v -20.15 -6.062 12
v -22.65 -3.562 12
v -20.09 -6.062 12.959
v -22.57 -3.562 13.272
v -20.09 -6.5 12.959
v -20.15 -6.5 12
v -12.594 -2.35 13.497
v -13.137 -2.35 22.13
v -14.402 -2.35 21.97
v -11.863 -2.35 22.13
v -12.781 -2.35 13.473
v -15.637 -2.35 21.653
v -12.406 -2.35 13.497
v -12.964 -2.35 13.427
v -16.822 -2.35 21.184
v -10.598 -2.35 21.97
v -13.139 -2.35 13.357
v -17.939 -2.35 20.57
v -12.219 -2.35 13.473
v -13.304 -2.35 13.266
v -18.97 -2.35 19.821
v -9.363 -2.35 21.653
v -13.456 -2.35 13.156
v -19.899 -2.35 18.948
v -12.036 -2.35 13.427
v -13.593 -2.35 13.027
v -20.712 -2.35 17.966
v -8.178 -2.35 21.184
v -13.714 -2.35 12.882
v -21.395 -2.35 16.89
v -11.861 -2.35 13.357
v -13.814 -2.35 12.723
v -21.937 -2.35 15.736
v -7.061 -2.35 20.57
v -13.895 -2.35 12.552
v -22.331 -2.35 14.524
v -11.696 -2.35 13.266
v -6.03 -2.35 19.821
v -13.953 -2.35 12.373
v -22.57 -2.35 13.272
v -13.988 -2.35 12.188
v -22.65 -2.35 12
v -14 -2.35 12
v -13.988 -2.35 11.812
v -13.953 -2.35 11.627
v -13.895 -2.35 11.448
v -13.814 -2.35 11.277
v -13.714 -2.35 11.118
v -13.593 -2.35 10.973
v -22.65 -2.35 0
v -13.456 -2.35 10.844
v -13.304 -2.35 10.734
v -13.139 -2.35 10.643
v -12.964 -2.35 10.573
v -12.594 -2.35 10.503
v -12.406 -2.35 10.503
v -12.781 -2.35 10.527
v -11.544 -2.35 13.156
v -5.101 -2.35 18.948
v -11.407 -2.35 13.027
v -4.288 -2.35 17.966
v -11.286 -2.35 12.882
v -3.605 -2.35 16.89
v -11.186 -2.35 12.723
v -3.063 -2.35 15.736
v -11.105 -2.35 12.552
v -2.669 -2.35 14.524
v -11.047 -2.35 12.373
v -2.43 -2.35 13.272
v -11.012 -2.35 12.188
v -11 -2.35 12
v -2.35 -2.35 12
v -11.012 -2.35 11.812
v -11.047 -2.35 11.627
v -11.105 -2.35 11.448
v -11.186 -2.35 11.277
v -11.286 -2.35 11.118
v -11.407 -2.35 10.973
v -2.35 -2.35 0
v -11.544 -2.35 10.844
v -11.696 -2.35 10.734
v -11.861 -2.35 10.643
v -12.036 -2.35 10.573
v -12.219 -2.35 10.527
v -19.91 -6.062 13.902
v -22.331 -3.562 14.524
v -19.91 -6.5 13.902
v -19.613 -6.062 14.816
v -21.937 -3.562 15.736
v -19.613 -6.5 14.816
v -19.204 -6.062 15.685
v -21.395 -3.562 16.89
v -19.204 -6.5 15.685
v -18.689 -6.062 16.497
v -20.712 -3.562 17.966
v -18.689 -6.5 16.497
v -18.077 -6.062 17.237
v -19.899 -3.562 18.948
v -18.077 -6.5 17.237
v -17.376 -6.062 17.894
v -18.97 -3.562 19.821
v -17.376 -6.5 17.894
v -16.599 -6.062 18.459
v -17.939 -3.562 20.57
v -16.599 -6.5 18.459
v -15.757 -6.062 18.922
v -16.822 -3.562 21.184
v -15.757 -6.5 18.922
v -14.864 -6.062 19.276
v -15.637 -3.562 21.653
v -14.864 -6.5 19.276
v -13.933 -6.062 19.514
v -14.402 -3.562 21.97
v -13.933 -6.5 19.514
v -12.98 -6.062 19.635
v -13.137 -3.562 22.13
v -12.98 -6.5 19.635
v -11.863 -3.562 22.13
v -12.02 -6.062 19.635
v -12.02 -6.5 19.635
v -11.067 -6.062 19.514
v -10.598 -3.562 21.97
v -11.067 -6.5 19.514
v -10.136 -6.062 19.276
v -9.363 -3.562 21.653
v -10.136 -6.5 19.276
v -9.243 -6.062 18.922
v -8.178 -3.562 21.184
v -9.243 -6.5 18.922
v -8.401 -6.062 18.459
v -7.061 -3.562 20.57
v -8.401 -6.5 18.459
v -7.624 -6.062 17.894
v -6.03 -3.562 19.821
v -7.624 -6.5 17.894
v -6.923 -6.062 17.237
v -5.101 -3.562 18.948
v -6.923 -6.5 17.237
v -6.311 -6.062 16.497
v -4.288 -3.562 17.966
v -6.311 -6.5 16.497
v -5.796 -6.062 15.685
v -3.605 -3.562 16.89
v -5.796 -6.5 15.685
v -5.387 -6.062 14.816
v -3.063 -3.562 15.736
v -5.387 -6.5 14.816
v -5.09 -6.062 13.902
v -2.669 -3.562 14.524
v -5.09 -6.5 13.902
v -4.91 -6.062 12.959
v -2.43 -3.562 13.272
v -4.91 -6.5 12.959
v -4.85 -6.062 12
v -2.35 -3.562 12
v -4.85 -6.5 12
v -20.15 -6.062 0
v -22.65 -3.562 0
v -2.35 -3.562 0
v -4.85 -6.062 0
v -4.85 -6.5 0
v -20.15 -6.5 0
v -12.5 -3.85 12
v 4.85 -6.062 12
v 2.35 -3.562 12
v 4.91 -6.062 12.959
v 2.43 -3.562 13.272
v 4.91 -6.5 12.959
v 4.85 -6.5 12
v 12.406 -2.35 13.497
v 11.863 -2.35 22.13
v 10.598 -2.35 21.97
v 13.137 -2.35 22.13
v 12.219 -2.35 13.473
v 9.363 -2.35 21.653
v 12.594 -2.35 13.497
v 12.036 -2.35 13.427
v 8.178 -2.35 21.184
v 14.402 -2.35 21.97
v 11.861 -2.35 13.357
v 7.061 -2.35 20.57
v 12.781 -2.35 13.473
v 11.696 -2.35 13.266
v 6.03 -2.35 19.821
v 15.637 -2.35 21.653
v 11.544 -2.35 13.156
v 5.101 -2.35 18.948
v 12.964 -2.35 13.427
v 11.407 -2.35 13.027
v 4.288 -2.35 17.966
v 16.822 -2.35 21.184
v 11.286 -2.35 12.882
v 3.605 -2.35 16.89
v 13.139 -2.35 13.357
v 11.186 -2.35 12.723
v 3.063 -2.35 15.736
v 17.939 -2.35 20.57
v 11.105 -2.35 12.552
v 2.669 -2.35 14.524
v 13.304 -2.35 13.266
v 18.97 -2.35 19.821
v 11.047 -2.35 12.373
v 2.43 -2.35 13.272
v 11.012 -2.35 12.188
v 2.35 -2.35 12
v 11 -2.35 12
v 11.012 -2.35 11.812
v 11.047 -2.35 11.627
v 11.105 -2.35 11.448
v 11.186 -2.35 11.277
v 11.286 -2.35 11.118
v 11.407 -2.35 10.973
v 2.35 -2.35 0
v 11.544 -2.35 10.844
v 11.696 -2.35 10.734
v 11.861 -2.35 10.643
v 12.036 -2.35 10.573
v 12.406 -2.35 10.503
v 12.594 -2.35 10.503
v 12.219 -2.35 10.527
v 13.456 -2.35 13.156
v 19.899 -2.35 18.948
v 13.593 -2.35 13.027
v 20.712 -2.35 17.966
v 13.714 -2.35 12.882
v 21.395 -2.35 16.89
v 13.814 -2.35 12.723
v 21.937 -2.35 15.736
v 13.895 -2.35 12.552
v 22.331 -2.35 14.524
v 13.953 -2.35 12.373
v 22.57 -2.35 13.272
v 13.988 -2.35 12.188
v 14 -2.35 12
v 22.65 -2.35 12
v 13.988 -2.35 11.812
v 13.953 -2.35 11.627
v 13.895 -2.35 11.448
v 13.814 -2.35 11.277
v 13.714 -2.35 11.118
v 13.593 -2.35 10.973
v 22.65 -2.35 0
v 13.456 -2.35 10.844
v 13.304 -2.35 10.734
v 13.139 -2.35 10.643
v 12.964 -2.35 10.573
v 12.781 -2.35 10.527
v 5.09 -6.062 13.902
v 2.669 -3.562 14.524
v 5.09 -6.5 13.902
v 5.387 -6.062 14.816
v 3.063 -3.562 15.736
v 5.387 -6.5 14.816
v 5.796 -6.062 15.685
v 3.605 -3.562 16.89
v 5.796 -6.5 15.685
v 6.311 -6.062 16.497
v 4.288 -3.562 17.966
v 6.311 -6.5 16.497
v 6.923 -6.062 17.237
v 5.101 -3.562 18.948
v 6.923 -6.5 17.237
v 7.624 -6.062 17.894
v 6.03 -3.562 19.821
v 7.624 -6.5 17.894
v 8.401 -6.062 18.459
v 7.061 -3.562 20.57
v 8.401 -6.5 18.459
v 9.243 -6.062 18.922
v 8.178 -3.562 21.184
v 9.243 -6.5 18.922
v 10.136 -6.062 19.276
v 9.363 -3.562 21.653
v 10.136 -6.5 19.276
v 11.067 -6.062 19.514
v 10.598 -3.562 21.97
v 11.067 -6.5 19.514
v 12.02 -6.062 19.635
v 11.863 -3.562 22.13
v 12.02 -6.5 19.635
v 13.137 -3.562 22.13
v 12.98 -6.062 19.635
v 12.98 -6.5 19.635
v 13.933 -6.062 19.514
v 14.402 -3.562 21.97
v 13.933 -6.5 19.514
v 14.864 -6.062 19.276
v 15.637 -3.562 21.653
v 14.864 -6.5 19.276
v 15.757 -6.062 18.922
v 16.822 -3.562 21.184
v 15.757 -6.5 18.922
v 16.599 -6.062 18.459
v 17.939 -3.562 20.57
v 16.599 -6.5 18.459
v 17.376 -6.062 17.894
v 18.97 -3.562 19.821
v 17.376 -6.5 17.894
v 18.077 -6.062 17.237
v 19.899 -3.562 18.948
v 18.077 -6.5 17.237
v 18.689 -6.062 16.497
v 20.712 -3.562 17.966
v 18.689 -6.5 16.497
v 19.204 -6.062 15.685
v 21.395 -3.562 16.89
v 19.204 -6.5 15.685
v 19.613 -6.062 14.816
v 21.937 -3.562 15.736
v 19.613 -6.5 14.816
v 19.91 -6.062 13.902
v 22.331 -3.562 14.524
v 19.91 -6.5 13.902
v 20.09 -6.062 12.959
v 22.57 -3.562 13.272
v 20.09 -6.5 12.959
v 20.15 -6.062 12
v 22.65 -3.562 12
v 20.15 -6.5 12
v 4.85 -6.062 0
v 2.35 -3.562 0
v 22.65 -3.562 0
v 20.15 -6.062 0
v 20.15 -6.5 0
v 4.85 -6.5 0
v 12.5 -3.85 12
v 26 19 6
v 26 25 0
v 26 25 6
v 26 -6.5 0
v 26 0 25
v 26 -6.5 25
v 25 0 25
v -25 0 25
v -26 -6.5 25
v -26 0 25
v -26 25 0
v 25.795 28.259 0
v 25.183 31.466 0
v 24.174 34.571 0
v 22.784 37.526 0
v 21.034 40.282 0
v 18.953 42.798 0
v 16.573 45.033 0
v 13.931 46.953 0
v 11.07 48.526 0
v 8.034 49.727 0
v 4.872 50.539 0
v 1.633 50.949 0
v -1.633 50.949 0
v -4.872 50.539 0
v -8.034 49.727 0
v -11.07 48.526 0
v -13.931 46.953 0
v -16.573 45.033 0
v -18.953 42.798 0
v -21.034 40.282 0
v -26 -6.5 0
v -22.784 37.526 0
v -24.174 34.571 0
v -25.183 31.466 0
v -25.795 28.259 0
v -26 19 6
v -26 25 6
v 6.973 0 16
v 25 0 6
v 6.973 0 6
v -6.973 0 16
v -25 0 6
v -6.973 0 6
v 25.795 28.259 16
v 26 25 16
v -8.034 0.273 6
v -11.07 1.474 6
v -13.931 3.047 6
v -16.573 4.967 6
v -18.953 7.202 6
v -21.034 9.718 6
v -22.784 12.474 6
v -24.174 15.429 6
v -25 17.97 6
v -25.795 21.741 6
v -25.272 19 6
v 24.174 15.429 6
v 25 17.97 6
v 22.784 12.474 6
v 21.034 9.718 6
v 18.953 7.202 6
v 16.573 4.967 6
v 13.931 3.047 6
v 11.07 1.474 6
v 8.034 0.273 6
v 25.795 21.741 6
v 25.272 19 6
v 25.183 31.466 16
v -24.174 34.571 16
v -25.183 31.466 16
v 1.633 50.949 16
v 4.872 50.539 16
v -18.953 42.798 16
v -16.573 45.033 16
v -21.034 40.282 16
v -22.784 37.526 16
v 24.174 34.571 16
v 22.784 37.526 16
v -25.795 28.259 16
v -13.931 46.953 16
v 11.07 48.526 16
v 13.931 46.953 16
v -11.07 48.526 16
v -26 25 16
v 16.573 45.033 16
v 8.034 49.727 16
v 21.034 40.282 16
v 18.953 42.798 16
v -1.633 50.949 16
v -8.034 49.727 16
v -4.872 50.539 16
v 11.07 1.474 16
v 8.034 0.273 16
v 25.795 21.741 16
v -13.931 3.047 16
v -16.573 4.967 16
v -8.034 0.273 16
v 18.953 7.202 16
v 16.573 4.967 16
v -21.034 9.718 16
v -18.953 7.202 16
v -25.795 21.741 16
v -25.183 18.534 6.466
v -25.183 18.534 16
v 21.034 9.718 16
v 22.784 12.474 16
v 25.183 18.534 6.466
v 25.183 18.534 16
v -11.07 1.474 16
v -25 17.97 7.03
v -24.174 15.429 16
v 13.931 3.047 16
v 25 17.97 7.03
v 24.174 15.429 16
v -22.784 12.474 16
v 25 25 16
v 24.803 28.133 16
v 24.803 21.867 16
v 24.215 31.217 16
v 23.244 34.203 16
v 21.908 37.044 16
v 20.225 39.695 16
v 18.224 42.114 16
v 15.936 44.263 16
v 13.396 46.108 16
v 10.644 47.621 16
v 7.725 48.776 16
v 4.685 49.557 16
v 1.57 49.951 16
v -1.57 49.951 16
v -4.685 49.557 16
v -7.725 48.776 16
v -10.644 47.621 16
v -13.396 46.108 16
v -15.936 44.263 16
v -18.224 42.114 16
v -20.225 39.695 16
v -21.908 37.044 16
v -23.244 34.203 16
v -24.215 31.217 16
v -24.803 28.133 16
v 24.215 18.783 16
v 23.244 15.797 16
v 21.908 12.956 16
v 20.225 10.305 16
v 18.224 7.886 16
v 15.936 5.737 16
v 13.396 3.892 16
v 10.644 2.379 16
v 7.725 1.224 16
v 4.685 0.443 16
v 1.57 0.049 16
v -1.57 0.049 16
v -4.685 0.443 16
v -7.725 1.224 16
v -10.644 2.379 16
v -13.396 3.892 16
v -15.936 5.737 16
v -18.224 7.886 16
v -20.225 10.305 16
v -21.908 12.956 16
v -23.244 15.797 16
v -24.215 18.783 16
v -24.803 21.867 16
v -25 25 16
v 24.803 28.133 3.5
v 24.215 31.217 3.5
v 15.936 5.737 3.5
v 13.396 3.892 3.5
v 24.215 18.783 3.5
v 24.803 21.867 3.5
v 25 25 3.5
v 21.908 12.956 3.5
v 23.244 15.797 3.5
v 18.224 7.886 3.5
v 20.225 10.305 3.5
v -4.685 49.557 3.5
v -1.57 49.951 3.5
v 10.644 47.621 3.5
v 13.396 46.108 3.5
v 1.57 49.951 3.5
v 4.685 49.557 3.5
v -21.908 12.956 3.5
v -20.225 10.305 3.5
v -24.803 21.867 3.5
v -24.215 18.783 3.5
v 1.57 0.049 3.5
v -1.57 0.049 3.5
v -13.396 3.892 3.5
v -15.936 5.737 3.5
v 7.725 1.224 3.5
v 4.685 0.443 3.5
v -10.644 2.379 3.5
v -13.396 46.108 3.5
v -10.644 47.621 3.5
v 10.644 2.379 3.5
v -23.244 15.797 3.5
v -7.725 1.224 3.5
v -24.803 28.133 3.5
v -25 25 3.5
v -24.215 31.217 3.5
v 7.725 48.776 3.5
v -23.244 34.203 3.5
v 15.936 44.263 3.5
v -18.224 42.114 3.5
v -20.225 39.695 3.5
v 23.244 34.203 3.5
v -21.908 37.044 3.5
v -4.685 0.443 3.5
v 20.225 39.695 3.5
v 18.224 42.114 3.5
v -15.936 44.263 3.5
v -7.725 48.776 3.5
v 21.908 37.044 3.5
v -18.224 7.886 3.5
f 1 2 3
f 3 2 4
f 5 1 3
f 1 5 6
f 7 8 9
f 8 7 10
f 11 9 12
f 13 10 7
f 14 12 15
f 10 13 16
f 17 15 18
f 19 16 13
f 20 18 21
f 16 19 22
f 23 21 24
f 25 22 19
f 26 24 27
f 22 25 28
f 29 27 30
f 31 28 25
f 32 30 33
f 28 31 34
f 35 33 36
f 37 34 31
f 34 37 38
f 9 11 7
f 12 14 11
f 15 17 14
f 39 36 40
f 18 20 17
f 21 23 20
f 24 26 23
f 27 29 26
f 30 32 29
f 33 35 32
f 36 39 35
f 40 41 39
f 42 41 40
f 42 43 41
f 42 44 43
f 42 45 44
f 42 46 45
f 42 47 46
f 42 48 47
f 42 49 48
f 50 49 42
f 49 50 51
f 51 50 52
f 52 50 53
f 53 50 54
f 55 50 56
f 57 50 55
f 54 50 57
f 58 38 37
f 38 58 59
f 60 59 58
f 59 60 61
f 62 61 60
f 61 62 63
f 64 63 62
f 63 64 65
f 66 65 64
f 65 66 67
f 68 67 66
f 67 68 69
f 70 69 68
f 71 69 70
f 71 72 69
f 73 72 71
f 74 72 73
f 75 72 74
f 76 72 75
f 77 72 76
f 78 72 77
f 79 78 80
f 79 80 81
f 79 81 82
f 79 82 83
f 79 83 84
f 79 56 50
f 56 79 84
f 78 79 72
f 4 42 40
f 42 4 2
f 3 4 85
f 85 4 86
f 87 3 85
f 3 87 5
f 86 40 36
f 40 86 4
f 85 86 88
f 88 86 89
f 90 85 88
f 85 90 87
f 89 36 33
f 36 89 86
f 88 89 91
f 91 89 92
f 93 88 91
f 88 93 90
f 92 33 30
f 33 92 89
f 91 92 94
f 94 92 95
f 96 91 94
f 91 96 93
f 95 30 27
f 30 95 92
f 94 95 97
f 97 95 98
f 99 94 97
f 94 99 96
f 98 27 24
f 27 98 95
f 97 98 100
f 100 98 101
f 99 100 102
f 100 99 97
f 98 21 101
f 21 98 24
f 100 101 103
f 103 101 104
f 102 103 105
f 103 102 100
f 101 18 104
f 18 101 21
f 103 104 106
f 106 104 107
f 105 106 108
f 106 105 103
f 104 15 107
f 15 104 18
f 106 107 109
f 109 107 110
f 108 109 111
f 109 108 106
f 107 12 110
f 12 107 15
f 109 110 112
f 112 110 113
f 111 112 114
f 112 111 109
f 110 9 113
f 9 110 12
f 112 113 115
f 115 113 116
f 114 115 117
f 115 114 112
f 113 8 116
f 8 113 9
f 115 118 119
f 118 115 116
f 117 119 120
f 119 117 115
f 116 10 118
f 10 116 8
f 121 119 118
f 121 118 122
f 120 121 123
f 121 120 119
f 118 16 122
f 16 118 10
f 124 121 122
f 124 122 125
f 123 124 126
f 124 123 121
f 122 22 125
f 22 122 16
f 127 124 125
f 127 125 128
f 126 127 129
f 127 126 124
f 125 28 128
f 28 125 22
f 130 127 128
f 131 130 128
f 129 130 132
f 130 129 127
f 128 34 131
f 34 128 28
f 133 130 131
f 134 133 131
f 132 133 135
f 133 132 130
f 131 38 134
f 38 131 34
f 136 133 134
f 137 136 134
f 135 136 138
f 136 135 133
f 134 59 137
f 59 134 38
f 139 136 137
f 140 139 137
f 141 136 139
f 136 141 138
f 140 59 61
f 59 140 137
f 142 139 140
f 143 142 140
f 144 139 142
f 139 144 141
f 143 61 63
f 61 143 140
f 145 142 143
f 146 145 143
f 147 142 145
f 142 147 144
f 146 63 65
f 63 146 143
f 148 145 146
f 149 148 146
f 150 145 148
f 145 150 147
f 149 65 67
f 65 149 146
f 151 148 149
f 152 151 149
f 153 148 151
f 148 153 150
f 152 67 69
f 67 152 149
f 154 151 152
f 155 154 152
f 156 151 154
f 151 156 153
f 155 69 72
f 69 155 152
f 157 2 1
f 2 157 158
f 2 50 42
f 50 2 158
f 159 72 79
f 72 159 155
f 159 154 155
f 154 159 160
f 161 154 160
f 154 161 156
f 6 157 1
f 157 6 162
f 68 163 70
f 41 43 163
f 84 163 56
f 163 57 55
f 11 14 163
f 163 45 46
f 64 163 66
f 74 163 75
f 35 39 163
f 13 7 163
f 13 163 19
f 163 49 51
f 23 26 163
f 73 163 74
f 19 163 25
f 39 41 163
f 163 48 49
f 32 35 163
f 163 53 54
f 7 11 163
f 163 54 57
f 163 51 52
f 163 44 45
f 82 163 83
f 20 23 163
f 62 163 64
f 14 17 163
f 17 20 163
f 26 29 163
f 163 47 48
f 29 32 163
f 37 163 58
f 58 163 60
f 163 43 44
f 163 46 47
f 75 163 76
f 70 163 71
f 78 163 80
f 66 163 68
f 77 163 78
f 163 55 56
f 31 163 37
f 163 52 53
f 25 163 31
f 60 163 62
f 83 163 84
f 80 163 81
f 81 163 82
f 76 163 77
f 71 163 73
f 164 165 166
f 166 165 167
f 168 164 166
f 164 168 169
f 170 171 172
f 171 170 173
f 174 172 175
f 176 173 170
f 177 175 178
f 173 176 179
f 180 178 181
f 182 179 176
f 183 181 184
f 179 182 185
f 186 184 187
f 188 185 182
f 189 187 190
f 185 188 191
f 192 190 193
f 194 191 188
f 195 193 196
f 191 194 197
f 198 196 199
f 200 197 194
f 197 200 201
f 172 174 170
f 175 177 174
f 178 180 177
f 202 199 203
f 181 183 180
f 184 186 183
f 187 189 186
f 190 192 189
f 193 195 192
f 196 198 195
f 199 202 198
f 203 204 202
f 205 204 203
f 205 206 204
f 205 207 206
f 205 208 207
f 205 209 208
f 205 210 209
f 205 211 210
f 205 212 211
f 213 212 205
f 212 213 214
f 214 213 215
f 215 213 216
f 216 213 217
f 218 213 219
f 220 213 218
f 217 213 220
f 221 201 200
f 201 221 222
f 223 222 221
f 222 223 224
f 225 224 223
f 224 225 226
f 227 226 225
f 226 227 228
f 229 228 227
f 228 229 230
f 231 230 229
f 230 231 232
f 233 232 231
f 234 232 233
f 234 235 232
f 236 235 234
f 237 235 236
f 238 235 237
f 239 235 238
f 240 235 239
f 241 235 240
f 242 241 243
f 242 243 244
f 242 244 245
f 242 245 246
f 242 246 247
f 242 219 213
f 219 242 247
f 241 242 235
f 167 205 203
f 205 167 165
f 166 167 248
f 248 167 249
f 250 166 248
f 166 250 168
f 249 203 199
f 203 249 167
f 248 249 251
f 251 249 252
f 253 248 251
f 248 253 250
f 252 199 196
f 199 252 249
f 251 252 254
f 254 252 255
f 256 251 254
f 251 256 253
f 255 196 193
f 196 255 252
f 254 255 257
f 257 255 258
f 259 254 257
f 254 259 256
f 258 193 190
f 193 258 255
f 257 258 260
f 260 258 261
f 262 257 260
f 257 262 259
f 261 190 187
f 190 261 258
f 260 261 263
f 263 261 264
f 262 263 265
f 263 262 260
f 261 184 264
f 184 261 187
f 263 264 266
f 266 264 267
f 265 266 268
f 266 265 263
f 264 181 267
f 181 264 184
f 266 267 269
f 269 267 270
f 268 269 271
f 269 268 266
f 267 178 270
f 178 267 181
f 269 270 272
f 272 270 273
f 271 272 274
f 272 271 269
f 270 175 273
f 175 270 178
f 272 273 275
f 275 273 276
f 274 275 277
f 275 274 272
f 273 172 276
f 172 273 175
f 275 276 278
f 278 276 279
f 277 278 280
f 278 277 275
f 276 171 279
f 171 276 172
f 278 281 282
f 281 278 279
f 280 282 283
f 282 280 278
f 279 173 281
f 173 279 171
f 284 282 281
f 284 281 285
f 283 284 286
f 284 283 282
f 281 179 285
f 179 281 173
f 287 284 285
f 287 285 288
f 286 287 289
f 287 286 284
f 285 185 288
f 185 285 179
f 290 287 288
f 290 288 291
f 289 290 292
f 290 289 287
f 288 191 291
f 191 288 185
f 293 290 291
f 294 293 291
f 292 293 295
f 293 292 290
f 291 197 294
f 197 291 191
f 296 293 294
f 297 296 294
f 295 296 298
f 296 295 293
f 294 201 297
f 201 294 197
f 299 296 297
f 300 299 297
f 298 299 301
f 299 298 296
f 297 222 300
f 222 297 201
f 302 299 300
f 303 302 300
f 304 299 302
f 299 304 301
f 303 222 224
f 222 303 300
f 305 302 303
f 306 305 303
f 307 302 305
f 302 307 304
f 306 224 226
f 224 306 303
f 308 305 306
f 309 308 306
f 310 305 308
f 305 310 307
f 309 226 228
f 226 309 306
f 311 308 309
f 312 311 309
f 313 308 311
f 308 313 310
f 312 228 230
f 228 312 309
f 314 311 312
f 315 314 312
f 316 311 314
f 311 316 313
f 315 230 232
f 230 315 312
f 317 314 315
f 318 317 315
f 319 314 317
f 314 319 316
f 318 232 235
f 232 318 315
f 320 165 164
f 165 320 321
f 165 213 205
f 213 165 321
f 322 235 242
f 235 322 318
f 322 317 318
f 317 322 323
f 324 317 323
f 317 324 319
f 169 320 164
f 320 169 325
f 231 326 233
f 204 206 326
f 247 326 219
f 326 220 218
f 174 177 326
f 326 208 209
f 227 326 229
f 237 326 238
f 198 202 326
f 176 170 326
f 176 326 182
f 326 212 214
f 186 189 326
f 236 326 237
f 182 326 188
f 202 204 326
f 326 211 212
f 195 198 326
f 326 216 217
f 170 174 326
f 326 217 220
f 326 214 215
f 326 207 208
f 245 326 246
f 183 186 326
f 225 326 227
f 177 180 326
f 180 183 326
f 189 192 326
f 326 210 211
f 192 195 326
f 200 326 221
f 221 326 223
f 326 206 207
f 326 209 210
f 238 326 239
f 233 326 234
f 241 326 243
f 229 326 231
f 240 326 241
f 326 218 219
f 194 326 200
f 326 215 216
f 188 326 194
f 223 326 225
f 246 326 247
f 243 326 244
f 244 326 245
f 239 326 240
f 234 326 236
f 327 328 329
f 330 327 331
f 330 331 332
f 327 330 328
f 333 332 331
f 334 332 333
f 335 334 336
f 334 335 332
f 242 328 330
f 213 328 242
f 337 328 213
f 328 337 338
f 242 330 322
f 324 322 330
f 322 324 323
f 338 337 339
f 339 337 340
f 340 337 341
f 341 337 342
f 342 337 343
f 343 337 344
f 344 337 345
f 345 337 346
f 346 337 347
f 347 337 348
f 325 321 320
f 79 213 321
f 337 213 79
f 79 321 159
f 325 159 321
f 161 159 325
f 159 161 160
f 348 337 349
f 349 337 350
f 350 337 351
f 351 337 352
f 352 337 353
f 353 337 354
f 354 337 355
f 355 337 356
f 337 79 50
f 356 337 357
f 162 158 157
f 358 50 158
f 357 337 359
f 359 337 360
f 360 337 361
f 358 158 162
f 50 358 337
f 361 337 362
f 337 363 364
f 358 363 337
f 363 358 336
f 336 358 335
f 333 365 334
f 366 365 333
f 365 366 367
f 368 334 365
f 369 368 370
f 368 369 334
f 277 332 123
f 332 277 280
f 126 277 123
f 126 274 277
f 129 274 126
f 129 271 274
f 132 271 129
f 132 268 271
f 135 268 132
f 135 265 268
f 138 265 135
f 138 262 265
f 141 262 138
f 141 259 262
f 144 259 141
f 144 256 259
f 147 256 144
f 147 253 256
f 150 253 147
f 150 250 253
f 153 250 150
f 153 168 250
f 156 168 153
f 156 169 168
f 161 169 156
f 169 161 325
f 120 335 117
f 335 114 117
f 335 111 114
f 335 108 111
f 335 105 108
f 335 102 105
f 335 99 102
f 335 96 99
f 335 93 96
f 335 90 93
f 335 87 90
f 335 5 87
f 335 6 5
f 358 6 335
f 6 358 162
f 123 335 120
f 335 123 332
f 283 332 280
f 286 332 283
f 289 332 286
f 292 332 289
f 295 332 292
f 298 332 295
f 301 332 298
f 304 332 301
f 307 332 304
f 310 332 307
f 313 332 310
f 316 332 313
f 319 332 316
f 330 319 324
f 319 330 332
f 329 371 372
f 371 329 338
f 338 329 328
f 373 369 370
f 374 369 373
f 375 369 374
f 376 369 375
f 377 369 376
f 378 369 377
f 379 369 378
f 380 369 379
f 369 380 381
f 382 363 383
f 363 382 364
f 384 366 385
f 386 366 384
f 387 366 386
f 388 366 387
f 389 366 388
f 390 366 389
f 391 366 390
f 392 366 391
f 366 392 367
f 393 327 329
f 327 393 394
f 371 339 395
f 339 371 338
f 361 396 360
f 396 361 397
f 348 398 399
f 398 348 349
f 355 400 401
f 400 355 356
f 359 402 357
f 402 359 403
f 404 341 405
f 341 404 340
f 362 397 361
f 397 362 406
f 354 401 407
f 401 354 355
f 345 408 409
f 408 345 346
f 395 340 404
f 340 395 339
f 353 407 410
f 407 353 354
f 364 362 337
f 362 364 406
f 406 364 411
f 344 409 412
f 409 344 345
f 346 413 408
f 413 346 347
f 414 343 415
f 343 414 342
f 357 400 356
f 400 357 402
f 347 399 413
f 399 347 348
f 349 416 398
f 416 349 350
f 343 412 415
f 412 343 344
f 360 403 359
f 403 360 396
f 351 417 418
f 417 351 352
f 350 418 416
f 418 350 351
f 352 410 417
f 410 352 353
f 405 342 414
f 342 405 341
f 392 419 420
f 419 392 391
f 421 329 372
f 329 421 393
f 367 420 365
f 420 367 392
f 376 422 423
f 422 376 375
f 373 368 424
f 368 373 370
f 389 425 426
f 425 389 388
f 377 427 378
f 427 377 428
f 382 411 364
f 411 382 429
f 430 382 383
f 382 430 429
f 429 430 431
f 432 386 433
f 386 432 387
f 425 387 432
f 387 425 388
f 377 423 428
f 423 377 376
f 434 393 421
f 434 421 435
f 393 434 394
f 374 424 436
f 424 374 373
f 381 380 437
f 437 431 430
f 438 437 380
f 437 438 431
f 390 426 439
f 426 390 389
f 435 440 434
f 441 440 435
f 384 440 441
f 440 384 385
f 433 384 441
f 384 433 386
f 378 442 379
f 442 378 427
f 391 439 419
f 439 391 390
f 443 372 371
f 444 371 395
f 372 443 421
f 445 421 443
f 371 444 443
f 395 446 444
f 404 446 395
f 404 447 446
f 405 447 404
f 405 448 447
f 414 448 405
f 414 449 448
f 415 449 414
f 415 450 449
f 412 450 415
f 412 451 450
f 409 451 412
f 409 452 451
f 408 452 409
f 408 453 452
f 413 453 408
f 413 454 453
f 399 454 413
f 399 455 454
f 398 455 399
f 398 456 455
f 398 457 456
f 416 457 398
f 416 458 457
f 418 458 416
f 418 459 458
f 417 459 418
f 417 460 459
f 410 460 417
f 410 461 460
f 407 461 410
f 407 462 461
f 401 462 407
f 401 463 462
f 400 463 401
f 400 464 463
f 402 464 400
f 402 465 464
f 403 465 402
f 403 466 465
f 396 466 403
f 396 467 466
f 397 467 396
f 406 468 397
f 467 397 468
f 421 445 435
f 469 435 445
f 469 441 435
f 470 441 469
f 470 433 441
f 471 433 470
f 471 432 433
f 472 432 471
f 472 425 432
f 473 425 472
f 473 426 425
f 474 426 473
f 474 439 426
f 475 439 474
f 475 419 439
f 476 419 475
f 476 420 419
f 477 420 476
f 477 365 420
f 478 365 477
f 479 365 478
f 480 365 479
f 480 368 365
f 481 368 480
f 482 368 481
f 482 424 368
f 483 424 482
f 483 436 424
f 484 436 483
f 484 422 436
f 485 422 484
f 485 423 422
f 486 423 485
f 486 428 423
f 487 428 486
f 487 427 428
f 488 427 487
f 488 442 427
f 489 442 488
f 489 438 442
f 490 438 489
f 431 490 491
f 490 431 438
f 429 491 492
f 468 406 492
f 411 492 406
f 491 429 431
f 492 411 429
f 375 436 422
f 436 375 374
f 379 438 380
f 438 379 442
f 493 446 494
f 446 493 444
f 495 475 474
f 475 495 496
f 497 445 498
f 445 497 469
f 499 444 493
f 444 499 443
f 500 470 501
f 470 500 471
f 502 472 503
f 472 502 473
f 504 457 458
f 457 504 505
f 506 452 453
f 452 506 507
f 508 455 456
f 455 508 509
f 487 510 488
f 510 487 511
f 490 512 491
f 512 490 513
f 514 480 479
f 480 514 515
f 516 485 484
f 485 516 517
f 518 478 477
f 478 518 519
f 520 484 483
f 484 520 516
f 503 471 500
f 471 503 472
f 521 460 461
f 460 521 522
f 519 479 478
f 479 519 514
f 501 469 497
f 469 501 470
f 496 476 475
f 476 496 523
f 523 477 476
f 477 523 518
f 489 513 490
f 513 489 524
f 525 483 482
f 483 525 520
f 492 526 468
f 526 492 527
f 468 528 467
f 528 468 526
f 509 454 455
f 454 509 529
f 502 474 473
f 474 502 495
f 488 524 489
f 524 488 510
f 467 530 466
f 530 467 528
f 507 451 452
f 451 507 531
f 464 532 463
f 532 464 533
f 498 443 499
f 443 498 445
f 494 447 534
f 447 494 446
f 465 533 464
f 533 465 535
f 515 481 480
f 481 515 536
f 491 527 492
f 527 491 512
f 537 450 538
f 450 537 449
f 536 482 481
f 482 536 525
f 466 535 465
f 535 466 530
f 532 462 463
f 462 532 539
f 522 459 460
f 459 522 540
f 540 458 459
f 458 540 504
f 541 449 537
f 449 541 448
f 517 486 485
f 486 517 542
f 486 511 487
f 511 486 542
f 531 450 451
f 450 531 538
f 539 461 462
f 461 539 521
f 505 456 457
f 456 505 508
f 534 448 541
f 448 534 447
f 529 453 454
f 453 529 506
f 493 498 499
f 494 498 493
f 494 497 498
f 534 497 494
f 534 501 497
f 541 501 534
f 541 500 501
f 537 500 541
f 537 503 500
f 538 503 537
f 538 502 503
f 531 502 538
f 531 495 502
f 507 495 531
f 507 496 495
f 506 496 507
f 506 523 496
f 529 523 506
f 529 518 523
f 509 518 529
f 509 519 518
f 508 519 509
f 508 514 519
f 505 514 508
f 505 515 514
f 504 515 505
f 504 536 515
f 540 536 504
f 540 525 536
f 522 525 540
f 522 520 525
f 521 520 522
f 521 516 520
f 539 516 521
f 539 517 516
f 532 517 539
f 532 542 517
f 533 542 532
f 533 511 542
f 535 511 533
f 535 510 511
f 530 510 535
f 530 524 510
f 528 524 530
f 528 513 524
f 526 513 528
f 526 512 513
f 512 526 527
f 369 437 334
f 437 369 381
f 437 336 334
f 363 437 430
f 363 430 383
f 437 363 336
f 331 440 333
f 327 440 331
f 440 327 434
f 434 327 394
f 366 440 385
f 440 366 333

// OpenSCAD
/*Created by Andy Levesque
Credit to @David D on Printables and Jonathan at Keep Making for Multiconnect and Multiboard, respectively
Licensed Creative Commons 4.0 Attribution Non-Commercial Sharable with Attribution
*/

/*[Parameters]*/
//diameter (in mm) of the item you wish to insert (this becomes the internal diameter)
itemDiameter = 50; //0.1
//thickness (in mm) of the wall surrounding the item
rimThickness = 1;
//Thickness (in mm) of the base underneath the item you are holding
baseThickness = 3;
//Additional thickness of the area between the item holding and the backer.
shelfSupportHeight = 3;
//Additional height (in mm) of the rim protruding upward to hold the item
rimHeight = 10;
//Additional Backer Height (in mm) in case you prefer additional support for something heavy
additionalBackerHeight = 0;
//Offset the holding position from the back wall
offSet = 0;
//Use cutout for holding items that are wider at the top
useCutout = false;

/*[Slot Customization]*/
//Distance between Multiconnect slots on the back (25mm is standard for MultiBoard)
distanceBetweenSlots = 25;
//QuickRelease removes the small indent in the top of the slots that lock the part into place
slotQuickRelease = false;
//Dimple scale tweaks the size of the dimple in the slot for printers that need a larger dimple to print correctly
dimpleScale = 1; //[0.5:.05:1.5]
//Scale the size of slots in the back (1.015 scale is default for a tight fit. Increase if your finding poor fit. )
slotTolerance = 1.00; //[0.925:0.005:1.075]
//Move the slot in (positive) or out (negative)
slotDepthMicroadjustment = 0; //[-.5:0.05:.5]
//enable a slot on-ramp for easy mounting of tall items
onRampEnabled = true;
//frequency of slots for on-ramp. 1 = every slot; 2 = every 2 slots; etc.
onRampEveryXSlots = 1;


/*[Hidden]*/
totalWidth = itemDiameter + rimThickness*2;
totalHeight = max(baseThickness+shelfSupportHeight+0.25*itemDiameter,25);

//start build
translate(v = [-max(totalWidth,distanceBetweenSlots)/2,0,0]) 
    multiconnectBack(backWidth = totalWidth, backHeight = totalHeight+additionalBackerHeight, distanceBetweenSlots = distanceBetweenSlots);
    //item holder
translate(v = [-totalWidth/2,0,0]) 
union() {
    difference() {
        //itemwalls
        union() {
            hull(){
                translate(v = [totalWidth/2,itemDiameter/2+offSet,0]) 
                    //outer circle
                    linear_extrude(height = shelfSupportHeight+baseThickness) 
                            circle(r = itemDiameter/2+rimThickness, $fn=50);
                    //wide back for hull operation
                    linear_extrude(height = shelfSupportHeight+baseThickness) 
                            square(size = [totalWidth,1]);
                }
            //thin holding wall
            translate(v = [totalWidth/2,itemDiameter/2+offSet,shelfSupportHeight+baseThickness]) 
                linear_extrude(height = rimHeight) 
                    circle(r = itemDiameter/2+rimThickness, $fn=50);
        }
        //itemDiameter (i.e., delete tool)
        translate(v = [totalWidth/2,(itemDiameter/2)+offSet,baseThickness+.5 - (useCutout?+(baseThickness*2)+1:0)]) linear_extrude(height = shelfSupportHeight+rimHeight+1+(useCutout?+(baseThickness*2):0)) circle(r = itemDiameter/2, $fn=50);
    }
    //brackets
    bracketSize = min(totalHeight-baseThickness-shelfSupportHeight, itemDiameter/2);
    translate(v = [rimThickness,0,bracketSize+baseThickness+shelfSupportHeight]) shelfBracket(bracketHeight = bracketSize, bracketDepth = bracketSize, rimThickness = rimThickness);
    translate(v = [rimThickness*2+itemDiameter,0,bracketSize+baseThickness+shelfSupportHeight]) shelfBracket(bracketHeight = bracketSize, bracketDepth = bracketSize, rimThickness = rimThickness);
}

//BEGIN MODULES
//Slotted back Module
module multiconnectBack(backWidth, backHeight, distanceBetweenSlots)
{
    //slot count calculates how many slots can fit on the back. Based on internal width for buffer. 
    //slot width needs to be at least the distance between slot for at least 1 slot to generate
    let (backWidth = max(backWidth,distanceBetweenSlots), backHeight = max(backHeight, 25),slotCount = floor(backWidth/distanceBetweenSlots), backThickness = 6.5){
        difference() {
            translate(v = [0,-backThickness,0]) cube(size = [backWidth,backThickness,backHeight]);
            //Loop through slots and center on the item
            //Note: I kept doing math until it looked right. It's possible this can be simplified.
            for (slotNum = [0:1:slotCount-1]) {
                translate(v = [distanceBetweenSlots/2+(backWidth/distanceBetweenSlots-slotCount)*distanceBetweenSlots/2+slotNum*distanceBetweenSlots,-2.35+slotDepthMicroadjustment,backHeight-13]) {
                    slotTool(backHeight);
                }
            }
        }
    }
    //Create Slot Tool
    module slotTool(totalHeight) {
        scale(v = slotTolerance)
        //slot minus optional dimple with optional on-ramp
        let (slotProfile = [[0,0],[10.15,0],[10.15,1.2121],[7.65,3.712],[7.65,5],[0,5]])
        difference() {
            union() {
                //round top
                rotate(a = [90,0,0,]) 
                    rotate_extrude($fn=50) 
                        polygon(points = slotProfile);
                //long slot
                translate(v = [0,0,0]) 
                    rotate(a = [180,0,0]) 
                    linear_extrude(height = totalHeight+1) 
                        union(){
                            polygon(points = slotProfile);
                            mirror([1,0,0])
                                polygon(points = slotProfile);
                        }
                //on-ramp
                if(onRampEnabled)
                    for(y = [1:onRampEveryXSlots:totalHeight/distanceBetweenSlots])
                        translate(v = [0,-5,-y*distanceBetweenSlots]) 
                            rotate(a = [-90,0,0]) 
                                cylinder(h = 5, r1 = 12, r2 = 10.15);
            }
            //dimple
            if (slotQuickRelease == false)
                scale(v = dimpleScale) 
                rotate(a = [90,0,0,]) 
                    rotate_extrude($fn=50) 
                        polygon(points = [[0,0],[0,1.5],[1.5,0]]);
        }
    }
}

module shelfBracket(bracketHeight, bracketDepth, rimThickness){
        rotate(a = [-90,0,90]) 
            linear_extrude(height = rimThickness) 
                polygon([[0,0],[0,bracketHeight],[bracketDepth,bracketHeight]]);
}
